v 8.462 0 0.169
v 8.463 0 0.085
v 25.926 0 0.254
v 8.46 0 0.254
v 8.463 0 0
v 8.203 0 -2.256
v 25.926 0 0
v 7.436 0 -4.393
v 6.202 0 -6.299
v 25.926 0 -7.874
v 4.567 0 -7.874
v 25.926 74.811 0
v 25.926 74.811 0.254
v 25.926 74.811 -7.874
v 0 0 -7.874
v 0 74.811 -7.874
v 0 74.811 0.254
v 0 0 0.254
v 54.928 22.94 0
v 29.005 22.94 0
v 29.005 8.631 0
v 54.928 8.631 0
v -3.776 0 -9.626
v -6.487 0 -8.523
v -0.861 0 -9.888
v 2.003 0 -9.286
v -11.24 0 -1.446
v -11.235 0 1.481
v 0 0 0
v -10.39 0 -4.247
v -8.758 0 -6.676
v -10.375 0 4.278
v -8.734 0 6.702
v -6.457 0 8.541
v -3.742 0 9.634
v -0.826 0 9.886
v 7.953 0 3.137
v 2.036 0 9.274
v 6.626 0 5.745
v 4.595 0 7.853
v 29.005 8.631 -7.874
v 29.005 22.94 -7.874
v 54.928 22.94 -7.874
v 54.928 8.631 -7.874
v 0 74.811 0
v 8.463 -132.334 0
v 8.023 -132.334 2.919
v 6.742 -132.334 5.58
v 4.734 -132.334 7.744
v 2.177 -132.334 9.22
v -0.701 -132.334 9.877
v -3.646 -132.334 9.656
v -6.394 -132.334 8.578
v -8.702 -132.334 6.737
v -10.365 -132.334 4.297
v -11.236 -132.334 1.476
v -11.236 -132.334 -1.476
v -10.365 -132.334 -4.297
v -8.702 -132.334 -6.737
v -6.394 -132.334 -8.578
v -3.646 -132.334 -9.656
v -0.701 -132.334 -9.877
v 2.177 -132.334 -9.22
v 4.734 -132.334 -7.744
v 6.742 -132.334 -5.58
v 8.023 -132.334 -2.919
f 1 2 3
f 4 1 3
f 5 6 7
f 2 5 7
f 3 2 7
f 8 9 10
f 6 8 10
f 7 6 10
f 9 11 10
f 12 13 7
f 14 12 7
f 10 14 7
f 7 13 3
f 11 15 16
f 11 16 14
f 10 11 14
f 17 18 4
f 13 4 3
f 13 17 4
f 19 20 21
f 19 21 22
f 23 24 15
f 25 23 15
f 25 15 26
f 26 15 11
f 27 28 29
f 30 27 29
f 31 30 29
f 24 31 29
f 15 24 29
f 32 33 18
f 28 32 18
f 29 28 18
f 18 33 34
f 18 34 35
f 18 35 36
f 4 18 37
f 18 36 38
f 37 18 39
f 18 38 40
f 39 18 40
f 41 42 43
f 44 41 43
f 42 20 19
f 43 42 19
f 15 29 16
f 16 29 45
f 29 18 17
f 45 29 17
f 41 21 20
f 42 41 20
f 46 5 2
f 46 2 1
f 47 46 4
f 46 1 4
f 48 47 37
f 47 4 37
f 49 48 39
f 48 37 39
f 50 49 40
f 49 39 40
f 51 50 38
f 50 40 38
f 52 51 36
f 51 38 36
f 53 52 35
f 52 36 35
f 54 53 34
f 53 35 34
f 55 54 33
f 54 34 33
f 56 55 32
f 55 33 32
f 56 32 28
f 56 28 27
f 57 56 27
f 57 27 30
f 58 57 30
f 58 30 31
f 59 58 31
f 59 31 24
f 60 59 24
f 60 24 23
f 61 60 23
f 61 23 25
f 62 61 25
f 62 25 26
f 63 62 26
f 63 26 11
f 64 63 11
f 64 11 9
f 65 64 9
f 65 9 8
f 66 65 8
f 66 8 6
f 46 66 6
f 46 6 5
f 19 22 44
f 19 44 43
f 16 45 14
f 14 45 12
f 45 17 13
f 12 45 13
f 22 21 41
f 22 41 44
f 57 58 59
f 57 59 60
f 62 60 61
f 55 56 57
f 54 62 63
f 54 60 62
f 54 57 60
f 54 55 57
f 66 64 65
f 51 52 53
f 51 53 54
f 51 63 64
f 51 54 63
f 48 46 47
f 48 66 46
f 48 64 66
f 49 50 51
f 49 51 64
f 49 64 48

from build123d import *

# Parameters (mm, degrees)
F1_R     = 9.9046935717
F2_DEPTH = 132.334
F4_W     = 25.9259901941
F4_H     = 74.8111829162
F5_DEPTH = 0.254
F6_W     = 25.9226001799
F6_H     = 14.3088037148
F7_DEPTH = 7.874


# Not quite as in the source:
# - the program builds the solid bodies; features that only make, move or delete a surface that nothing else refers to are left out


with BuildPart() as f2:
    # F1 (on Front) → F2 (new body)
    with BuildSketch(Plane.XZ):
        with Locations((-1.4416209888, 0)):
            Circle(F1_R)
    extrude(amount=F2_DEPTH)

    # F4 (on Top) → F5 (join)
    with BuildSketch(Plane.XY):
        with Locations((12.962995097, 37.4055914581)):
            Rectangle(F4_W, F4_H)
    extrude(amount=F5_DEPTH)

    # F6 (on Top) + F5_face (on face) + F5_face1 (on face) → F7 (join)
    with BuildSketch(Plane.XY):
        with Locations((41.966361925, 15.7852205448)):
            Rectangle(F6_W, F6_H)
    with BuildSketch(Plane(origin=(12.962995097, 37.4055914581, 0), x_dir=(1, 0, 0), z_dir=(0, 0, -1))):
        Polygon((-12.962995097, 37.4055914581), (-12.962995097, -37.4055914581), (12.962995097, -37.4055914581), (12.962995097, 37.4055914581), (-4.4999225141, 37.4055914581), align=None)
    with BuildSketch(Plane(origin=(12.962995097, 37.4055914581, 0.254), x_dir=(1, 0, 0), z_dir=(0, 0, 1))):
        Polygon((-12.962995097, 37.4055914581), (-12.962995097, -37.4055914581), (-4.5031798895, -37.4055914581), (12.962995097, -37.4055914581), (12.962995097, 37.4055914581), align=None)
    extrude(amount=-F7_DEPTH, dir=(0, 0, 1))


solid = f2.part
